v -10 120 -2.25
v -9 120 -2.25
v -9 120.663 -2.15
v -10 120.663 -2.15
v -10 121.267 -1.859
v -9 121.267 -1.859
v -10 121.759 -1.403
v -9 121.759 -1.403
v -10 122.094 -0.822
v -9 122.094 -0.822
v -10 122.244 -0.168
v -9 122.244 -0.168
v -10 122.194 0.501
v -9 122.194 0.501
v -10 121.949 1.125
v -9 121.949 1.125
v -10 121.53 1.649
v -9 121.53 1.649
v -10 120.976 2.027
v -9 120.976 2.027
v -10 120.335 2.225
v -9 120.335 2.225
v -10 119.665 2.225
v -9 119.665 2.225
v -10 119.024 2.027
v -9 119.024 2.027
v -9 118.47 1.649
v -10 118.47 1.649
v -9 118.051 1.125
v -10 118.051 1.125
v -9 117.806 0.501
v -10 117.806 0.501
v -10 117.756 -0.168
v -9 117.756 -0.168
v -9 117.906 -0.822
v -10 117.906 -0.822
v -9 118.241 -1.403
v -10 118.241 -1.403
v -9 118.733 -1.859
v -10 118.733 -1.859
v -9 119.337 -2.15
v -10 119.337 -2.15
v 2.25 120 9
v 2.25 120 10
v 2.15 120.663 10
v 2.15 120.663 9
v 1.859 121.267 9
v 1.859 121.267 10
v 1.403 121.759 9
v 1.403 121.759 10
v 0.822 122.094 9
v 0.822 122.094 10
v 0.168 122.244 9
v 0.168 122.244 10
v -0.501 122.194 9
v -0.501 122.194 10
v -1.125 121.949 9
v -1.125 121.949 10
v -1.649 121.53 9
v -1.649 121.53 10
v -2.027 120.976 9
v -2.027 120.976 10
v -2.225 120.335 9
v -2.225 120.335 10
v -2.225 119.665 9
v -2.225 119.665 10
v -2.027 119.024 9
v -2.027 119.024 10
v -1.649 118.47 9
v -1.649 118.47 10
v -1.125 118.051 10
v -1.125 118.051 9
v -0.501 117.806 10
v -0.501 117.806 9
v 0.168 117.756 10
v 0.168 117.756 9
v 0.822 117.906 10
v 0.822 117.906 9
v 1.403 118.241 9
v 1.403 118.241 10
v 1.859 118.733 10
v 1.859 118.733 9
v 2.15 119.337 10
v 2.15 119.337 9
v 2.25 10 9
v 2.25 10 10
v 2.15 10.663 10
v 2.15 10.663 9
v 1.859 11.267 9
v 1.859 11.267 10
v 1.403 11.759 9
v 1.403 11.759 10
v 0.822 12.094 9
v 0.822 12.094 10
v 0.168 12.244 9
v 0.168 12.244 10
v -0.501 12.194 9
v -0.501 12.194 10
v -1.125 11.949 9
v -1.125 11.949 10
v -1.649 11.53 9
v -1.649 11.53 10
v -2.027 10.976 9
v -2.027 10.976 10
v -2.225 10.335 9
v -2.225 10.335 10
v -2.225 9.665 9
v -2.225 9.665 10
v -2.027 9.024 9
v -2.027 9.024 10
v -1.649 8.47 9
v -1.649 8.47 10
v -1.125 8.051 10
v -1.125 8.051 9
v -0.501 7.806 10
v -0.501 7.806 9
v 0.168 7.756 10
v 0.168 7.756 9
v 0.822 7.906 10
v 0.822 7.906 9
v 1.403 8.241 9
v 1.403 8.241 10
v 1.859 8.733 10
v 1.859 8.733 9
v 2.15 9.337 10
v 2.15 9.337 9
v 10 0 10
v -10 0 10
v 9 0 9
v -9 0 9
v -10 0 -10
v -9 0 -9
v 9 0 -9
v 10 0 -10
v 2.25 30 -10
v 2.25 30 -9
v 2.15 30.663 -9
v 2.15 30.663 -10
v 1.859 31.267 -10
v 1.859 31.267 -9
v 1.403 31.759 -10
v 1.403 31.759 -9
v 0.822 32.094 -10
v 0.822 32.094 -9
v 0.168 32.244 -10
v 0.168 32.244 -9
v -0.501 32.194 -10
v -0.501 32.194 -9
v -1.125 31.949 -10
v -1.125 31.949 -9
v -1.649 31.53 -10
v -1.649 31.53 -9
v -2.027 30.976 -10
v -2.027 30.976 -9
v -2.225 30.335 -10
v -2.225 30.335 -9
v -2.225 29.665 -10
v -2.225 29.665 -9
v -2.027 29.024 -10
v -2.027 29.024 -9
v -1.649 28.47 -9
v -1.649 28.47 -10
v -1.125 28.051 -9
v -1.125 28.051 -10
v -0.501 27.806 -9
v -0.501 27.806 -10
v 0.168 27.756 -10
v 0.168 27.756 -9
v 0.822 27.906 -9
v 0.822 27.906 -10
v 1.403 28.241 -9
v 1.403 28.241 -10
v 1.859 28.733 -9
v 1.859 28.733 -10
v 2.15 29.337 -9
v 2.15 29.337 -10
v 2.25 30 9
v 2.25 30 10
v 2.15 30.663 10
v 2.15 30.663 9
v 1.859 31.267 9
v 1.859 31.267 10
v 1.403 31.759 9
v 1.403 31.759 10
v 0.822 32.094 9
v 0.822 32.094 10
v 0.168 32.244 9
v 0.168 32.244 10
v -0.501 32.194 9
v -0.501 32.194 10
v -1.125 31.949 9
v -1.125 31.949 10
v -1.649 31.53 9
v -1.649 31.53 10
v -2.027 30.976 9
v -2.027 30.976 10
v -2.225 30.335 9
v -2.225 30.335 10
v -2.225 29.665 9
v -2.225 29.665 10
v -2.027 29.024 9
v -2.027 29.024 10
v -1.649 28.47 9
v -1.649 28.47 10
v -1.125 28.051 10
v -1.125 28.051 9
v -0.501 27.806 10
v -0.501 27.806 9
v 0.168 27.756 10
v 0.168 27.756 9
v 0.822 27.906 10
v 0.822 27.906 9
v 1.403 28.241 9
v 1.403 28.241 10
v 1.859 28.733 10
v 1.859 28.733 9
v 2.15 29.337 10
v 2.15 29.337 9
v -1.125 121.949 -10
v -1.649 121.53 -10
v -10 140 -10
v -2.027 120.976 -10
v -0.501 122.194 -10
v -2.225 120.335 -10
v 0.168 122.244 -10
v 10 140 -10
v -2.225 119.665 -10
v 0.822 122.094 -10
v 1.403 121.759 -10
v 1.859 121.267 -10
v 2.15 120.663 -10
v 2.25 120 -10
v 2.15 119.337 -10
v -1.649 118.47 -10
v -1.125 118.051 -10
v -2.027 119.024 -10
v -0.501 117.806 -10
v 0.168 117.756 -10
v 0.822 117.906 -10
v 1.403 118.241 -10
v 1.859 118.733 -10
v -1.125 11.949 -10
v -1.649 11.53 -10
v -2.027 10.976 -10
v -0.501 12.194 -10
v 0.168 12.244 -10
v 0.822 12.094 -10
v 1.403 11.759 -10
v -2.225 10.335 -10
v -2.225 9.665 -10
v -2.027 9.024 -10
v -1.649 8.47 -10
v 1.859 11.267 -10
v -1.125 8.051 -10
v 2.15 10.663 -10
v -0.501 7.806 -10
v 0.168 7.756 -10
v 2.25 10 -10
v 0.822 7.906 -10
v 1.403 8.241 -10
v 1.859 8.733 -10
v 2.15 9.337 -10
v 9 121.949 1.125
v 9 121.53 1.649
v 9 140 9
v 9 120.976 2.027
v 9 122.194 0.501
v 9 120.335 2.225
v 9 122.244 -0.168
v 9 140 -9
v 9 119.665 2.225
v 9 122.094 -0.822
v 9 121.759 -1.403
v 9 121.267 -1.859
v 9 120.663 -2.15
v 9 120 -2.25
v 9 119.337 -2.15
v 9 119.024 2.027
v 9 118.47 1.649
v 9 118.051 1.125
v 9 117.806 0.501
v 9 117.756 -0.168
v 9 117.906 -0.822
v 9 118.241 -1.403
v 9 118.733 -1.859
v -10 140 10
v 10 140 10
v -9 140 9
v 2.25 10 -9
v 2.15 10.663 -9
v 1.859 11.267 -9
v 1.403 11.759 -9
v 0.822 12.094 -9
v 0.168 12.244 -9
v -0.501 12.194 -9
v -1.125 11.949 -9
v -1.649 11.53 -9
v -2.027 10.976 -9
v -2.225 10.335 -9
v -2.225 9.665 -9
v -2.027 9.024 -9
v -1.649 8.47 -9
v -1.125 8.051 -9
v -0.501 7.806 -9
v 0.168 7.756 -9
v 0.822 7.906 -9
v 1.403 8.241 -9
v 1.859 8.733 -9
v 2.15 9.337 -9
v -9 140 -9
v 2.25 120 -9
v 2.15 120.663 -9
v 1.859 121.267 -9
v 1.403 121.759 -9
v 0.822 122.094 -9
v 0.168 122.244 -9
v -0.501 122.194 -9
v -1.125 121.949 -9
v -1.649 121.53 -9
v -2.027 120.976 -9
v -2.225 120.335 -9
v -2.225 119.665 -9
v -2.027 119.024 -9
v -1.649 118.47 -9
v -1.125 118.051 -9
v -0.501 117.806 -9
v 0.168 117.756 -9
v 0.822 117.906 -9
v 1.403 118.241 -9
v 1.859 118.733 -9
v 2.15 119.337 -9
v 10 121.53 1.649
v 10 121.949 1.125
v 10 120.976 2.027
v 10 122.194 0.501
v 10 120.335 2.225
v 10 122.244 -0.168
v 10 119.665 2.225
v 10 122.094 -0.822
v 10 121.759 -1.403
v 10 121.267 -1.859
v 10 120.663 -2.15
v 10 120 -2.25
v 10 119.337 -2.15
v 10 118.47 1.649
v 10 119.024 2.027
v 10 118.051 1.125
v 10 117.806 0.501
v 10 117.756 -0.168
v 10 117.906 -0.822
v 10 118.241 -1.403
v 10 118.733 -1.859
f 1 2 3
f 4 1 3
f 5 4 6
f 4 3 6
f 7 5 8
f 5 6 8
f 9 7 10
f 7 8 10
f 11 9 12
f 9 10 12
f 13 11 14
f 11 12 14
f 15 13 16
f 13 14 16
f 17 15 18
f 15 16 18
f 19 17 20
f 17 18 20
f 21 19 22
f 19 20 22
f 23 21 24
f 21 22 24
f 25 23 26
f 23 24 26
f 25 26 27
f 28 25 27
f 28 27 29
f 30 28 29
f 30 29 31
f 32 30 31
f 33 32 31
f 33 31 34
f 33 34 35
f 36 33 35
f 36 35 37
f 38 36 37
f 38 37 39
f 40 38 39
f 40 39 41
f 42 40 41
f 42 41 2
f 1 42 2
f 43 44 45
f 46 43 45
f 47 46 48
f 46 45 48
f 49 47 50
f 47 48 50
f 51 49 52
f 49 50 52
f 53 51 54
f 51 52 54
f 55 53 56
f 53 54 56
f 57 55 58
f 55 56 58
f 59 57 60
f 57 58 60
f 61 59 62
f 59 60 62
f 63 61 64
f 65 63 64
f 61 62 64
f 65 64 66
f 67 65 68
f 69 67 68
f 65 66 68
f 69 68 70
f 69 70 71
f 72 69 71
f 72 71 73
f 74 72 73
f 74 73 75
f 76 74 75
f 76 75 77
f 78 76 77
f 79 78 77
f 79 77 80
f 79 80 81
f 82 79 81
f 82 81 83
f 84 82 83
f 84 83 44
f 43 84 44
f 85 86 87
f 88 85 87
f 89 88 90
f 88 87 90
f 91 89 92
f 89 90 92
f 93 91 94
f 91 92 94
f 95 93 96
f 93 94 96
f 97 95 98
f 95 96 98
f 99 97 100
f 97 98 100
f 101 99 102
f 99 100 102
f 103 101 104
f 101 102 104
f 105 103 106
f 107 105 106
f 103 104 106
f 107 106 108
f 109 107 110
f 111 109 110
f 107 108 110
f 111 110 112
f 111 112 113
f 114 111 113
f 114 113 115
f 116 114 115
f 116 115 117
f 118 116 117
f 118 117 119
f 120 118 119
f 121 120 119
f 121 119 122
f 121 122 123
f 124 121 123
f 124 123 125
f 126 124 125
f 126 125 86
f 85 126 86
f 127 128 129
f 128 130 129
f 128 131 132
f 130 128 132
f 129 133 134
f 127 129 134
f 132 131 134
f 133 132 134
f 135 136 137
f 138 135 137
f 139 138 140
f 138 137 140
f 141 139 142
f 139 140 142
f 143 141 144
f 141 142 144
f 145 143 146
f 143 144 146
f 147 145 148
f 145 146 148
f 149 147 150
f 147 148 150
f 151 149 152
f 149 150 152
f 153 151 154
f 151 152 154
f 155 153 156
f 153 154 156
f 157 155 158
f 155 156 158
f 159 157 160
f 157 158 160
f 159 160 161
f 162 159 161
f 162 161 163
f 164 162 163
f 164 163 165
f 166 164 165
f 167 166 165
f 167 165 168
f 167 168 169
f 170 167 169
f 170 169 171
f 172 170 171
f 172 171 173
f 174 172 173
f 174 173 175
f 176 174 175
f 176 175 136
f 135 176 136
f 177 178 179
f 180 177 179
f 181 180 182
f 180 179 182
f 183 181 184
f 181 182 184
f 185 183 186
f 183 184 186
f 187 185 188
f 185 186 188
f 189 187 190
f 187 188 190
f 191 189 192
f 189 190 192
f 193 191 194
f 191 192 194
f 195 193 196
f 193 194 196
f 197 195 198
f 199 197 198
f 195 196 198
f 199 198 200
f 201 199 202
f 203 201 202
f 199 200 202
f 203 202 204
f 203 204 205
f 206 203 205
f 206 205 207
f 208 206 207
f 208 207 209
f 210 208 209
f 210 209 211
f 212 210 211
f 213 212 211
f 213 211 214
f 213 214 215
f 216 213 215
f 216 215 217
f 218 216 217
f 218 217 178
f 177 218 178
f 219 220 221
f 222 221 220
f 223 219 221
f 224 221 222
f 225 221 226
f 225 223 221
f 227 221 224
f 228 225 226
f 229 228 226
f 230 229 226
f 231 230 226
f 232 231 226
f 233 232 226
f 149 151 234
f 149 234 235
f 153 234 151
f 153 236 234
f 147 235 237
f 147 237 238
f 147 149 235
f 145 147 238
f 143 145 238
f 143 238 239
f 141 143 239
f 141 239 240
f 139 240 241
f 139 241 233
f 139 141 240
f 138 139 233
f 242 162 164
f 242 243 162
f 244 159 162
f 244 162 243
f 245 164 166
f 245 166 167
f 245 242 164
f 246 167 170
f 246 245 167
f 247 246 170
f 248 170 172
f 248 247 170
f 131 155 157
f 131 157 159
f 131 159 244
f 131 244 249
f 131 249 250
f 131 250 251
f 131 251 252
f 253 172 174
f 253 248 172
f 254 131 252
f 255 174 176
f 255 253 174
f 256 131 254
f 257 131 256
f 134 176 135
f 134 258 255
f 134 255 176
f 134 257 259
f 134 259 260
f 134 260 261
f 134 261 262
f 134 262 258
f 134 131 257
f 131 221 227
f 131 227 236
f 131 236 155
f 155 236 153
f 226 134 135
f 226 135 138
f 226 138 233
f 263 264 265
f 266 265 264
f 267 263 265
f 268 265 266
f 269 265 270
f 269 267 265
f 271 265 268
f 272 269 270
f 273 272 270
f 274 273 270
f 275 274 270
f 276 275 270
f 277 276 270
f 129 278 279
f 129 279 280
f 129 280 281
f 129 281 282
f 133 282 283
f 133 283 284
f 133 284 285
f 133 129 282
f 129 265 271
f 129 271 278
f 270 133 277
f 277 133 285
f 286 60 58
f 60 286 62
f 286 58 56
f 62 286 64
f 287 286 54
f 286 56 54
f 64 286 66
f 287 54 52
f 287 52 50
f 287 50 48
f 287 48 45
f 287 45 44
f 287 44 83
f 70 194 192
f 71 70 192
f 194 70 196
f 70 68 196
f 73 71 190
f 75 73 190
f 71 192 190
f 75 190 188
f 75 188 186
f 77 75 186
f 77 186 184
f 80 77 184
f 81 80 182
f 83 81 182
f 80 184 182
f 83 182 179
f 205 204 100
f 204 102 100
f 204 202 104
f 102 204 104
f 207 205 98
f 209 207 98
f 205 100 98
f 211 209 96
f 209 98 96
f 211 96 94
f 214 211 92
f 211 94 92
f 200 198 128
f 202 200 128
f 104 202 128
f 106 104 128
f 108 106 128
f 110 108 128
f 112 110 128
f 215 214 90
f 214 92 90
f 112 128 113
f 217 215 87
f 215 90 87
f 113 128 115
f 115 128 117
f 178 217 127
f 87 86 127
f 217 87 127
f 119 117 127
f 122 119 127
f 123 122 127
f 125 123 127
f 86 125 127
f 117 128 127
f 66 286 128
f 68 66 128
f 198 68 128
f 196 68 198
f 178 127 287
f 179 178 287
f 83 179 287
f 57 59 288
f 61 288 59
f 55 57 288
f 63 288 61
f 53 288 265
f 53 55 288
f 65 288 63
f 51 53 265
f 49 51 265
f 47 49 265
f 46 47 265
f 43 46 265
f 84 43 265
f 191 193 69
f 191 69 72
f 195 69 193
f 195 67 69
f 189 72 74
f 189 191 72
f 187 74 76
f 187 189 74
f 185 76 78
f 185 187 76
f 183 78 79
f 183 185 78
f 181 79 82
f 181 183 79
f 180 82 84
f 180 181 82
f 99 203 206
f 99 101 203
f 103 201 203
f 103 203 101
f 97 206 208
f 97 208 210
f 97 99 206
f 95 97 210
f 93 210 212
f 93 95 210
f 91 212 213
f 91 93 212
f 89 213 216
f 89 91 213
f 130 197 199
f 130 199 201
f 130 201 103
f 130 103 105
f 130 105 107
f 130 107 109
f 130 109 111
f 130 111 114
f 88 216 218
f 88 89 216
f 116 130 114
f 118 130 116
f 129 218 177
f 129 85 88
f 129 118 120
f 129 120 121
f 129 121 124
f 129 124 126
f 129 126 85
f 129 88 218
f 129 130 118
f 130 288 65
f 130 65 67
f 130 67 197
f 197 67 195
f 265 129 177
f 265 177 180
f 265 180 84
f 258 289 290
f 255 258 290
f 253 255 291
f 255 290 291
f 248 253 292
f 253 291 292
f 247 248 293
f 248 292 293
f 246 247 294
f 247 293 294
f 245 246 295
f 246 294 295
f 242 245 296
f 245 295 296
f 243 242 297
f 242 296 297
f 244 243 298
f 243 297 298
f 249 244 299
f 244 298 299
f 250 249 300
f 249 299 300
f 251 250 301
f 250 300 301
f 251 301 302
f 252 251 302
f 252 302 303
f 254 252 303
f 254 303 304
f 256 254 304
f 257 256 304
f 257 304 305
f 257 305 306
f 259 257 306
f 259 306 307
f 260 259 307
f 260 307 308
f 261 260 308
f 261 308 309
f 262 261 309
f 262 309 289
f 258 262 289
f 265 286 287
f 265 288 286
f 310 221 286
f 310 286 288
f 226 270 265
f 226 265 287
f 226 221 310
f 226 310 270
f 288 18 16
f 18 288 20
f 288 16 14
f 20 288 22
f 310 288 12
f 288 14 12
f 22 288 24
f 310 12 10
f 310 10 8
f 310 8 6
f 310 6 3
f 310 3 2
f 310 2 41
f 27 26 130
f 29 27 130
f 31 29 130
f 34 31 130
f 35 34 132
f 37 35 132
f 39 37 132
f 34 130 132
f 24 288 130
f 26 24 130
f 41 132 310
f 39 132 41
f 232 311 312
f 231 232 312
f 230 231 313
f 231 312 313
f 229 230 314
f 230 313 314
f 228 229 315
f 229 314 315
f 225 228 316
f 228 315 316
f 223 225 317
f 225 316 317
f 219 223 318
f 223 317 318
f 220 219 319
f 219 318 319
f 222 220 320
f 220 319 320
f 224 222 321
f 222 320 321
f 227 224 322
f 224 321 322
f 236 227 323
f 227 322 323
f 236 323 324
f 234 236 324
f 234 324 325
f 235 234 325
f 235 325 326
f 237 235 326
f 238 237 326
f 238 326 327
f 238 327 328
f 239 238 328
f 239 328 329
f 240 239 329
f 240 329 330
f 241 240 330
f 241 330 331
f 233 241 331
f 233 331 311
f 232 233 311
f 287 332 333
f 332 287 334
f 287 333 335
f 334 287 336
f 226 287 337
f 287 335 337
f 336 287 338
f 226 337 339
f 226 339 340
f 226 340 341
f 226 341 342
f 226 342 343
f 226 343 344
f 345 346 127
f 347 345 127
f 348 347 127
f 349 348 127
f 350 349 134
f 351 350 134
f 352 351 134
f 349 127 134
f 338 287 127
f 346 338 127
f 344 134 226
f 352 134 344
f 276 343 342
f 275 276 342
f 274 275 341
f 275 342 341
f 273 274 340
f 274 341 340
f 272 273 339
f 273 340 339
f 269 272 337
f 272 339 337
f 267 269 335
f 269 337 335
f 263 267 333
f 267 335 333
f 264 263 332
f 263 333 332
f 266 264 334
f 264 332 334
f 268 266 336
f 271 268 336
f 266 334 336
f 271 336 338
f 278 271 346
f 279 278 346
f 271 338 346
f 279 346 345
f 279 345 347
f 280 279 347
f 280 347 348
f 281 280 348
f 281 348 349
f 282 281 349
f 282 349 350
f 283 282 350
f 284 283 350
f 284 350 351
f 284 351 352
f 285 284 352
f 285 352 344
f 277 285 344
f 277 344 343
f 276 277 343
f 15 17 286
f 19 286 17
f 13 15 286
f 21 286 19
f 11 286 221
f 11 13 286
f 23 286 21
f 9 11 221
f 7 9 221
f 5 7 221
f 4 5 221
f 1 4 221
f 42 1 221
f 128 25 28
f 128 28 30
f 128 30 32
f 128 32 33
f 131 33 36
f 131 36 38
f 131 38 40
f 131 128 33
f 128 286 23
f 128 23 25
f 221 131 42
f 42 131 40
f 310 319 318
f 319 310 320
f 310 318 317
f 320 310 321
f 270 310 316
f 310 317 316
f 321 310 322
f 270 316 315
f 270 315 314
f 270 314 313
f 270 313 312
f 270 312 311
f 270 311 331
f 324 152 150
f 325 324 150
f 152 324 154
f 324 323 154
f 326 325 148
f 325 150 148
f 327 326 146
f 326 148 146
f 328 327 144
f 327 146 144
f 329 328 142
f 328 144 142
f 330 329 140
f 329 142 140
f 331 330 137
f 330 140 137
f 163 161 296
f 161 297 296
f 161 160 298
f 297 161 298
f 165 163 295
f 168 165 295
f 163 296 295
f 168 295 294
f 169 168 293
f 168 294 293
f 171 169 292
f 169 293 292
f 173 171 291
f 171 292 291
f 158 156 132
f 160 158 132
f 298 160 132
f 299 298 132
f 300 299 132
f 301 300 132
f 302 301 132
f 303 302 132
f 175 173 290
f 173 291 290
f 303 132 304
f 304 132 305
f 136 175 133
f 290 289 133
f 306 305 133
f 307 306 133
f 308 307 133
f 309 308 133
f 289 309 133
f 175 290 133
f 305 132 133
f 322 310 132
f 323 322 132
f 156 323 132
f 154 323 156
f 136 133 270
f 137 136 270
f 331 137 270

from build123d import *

# Parameters (mm, degrees)
SKETCH1_W           = 20
SKETCH1_H           = 20
SKETCH1_W_2         = 18
SKETCH1_H_2         = 18
BOSS_EXTRUDE1_DEPTH = 140
SKETCH2_R           = 2.25
CUT_EXTRUDE1_DEPTH  = 142.774468788
SKETCH3_R           = 2.25
CUT_EXTRUDE2_DEPTH  = 142.774468788


with BuildPart() as part:
    # Sketch1 → Boss-Extrude1 (new body)
    with BuildSketch(Plane(origin=(0, 0, 0), x_dir=(1, 0, 0), z_dir=(0, 1, 0))):
        Rectangle(SKETCH1_W, SKETCH1_H)
        Rectangle(SKETCH1_W_2, SKETCH1_H_2, mode=Mode.SUBTRACT)
    extrude(amount=BOSS_EXTRUDE1_DEPTH)

    # Sketch2 → Cut-Extrude1 (cut, through all)
    with BuildSketch(Plane.XY.offset(10)):
        with Locations((0, 10)):
            Circle(SKETCH2_R)
        with Locations((0, 30)):
            Circle(SKETCH2_R)
        with Locations((0, 120)):
            Circle(SKETCH2_R)
    extrude(amount=-CUT_EXTRUDE1_DEPTH, mode=Mode.SUBTRACT)

    # Sketch3 → Cut-Extrude2 (cut, through all)
    with BuildSketch(Plane(origin=(10, 0, 0), x_dir=(0, 0, -1), z_dir=(1, 0, 0))):
        with Locations((0, 120)):
            Circle(SKETCH3_R)
    extrude(amount=-CUT_EXTRUDE2_DEPTH, mode=Mode.SUBTRACT)


solid = part.part
